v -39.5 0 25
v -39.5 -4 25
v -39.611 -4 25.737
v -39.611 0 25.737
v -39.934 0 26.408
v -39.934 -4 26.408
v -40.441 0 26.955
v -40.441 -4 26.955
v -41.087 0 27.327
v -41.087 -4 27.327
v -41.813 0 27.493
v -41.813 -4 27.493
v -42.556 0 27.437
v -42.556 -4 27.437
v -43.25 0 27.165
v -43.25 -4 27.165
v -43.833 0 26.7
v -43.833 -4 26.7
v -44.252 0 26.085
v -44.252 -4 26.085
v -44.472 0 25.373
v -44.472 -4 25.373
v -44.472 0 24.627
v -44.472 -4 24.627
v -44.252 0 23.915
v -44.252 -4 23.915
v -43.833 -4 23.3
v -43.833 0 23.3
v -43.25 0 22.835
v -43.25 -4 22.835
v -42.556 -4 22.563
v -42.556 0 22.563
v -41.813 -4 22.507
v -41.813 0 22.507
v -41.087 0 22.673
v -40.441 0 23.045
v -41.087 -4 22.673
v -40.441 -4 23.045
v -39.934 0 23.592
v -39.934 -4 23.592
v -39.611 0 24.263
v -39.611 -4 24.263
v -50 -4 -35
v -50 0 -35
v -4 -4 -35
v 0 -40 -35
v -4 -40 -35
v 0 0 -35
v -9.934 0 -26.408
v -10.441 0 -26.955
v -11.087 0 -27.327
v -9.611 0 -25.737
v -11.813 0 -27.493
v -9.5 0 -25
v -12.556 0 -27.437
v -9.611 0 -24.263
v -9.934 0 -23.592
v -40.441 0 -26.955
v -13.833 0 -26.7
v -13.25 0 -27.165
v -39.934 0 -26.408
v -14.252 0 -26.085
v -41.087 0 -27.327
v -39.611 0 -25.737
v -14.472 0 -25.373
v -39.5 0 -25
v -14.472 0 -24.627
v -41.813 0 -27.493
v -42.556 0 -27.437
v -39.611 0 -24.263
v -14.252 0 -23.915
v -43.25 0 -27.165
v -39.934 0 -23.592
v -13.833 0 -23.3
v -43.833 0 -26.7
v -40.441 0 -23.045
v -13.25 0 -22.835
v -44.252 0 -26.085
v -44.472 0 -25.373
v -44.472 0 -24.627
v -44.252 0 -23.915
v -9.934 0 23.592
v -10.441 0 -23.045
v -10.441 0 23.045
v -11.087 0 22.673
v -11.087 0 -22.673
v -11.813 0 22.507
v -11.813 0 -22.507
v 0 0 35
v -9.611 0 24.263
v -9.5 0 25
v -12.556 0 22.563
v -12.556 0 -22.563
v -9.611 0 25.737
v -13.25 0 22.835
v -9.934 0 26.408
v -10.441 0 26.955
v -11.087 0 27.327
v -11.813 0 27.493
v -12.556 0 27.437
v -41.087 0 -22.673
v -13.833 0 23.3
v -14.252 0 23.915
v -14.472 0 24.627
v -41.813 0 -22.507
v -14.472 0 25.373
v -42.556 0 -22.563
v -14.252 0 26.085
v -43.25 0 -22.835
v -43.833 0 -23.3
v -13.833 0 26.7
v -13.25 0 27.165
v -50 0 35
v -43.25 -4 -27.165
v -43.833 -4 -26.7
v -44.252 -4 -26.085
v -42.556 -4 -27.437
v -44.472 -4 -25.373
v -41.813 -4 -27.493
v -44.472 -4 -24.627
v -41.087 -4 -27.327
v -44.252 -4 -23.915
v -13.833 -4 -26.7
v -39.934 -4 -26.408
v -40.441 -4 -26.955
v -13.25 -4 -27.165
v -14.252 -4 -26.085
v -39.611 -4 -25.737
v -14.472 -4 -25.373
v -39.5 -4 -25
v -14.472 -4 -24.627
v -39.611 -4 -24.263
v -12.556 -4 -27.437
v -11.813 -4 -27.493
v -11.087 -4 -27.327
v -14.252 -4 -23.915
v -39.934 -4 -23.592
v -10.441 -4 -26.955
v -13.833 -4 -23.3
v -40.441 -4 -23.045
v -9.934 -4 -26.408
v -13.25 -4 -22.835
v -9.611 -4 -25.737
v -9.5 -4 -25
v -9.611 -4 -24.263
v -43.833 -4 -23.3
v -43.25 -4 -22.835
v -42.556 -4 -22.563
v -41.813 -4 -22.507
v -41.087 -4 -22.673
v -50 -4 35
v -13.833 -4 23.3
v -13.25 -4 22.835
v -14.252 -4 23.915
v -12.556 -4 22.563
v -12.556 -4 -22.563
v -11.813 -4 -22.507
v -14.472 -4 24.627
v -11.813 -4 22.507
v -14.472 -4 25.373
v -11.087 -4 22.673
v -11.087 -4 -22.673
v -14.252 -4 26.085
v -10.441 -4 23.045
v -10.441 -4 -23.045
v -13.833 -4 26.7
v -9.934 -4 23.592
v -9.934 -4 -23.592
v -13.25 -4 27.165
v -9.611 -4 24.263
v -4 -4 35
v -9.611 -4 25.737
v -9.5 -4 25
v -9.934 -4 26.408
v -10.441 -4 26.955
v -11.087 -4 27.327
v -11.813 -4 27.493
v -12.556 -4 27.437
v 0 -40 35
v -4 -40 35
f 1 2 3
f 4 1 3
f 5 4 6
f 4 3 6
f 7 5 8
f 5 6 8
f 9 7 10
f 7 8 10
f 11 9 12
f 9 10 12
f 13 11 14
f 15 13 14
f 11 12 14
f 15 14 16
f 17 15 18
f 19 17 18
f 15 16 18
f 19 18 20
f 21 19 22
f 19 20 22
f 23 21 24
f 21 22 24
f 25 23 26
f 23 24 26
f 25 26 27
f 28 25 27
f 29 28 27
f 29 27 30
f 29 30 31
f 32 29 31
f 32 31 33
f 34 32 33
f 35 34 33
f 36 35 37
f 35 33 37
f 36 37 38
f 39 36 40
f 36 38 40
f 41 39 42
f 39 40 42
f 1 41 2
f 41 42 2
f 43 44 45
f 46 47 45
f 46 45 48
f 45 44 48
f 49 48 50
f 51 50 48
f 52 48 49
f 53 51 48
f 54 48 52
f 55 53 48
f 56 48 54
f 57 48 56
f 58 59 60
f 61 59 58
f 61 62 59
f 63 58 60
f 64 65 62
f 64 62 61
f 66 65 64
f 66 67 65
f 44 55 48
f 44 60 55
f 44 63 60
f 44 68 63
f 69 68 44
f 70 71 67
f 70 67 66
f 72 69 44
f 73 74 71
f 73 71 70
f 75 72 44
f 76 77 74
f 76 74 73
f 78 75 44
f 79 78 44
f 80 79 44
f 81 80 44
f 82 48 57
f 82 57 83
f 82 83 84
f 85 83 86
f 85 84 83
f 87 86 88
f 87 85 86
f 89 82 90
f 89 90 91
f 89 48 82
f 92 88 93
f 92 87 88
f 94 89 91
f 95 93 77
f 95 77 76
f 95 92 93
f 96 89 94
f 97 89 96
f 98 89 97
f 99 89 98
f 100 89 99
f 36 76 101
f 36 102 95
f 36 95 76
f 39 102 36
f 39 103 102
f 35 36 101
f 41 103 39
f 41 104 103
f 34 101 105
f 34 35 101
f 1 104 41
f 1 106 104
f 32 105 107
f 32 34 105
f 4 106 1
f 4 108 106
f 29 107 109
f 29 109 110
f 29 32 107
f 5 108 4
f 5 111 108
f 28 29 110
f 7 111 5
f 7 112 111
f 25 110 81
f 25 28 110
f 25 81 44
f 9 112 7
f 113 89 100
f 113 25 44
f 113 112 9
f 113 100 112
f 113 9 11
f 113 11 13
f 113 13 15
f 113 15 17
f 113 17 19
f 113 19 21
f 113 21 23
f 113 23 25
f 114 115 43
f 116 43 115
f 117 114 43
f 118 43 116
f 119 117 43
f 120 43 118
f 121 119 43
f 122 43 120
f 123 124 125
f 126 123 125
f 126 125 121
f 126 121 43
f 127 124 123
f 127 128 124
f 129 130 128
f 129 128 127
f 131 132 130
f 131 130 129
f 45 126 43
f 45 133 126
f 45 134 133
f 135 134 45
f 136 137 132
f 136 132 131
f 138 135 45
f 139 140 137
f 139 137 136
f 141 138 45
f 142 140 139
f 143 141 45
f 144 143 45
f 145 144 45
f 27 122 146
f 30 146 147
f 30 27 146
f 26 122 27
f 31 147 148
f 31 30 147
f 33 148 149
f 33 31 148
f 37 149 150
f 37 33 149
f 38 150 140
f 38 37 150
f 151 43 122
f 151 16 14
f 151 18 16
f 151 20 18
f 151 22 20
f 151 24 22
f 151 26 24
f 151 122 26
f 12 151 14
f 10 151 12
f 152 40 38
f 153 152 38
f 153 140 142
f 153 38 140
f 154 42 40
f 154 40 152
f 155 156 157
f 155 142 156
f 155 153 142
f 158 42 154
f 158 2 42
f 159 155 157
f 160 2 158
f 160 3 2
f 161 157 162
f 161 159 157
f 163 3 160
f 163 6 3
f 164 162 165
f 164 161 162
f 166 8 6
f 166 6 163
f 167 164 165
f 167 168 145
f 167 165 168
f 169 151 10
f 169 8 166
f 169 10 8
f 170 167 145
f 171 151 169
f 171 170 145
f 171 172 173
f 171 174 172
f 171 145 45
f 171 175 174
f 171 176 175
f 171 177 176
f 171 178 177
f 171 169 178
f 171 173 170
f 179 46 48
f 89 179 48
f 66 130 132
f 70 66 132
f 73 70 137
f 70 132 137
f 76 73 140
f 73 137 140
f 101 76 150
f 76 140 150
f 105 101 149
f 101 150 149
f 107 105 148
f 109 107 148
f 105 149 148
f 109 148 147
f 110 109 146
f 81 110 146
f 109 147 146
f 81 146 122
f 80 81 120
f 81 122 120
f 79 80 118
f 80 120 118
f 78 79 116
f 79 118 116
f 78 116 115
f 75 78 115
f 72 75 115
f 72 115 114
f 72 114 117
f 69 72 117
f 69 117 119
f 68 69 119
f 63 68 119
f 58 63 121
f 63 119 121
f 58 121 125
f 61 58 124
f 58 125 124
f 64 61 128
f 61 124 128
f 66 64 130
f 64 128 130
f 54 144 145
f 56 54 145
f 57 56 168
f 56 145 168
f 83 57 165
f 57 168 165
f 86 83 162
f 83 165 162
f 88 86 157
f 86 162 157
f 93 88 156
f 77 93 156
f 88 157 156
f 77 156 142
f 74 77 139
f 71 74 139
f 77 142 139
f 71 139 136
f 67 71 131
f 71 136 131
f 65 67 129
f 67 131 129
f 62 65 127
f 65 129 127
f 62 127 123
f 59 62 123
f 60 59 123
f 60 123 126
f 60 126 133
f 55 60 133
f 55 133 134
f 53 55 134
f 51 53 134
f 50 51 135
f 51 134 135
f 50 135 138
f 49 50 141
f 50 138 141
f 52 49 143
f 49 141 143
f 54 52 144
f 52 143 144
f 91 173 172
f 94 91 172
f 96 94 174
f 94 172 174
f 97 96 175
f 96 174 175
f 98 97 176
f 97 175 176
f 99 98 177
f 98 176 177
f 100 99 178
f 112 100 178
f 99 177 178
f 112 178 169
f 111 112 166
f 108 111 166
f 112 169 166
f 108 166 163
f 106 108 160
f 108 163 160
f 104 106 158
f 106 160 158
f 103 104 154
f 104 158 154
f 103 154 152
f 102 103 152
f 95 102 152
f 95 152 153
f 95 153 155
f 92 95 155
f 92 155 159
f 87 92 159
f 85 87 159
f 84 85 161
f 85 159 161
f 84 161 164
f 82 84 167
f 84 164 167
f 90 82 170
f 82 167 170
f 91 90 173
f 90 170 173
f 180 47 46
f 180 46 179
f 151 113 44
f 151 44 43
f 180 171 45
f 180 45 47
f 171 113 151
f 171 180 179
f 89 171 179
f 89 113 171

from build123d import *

# Parameters (mm, degrees)
SALIENTE_EXTRUIR1_DEPTH      = 35
SALIENTE_EXTRUIR1_DEPTH_BACK = 35
CROQUIS3_R                   = 2.5
CORTAR_EXTRUIR1_DEPTH        = 4
CROQUIS4_W                   = 70
CROQUIS4_H                   = 10
CORTAR_EXTRUIR2_DEPTH        = 10


with BuildPart() as part:
    # Croquis2 → Saliente-Extruir1 (new body, two sides)
    with BuildSketch(Plane.XY) as saliente_extruir1_sk:
        Polygon((0, 0), (-50, 0), (-50, -4), (-4, -4), (-4, -50), (0, -50), align=None)
    extrude(amount=SALIENTE_EXTRUIR1_DEPTH)
    extrude(saliente_extruir1_sk.sketch, amount=-SALIENTE_EXTRUIR1_DEPTH_BACK)

    # Croquis3 → Cortar-Extruir1 (cut)
    with BuildSketch(Plane.XZ.offset(4)):
        with Locations((-12, 25)):
            Circle(CROQUIS3_R)
        with Locations((-12, -25)):
            Circle(CROQUIS3_R)
        with Locations((-42, 25)):
            Circle(CROQUIS3_R)
        with Locations((-42, -25)):
            Circle(CROQUIS3_R)
    extrude(amount=-CORTAR_EXTRUIR1_DEPTH, mode=Mode.SUBTRACT)

    # Croquis4 → Cortar-Extruir2 (cut)
    with BuildSketch(Plane.ZY.offset(4)):
        with Locations((0, -45)):
            Rectangle(CROQUIS4_W, CROQUIS4_H)
    extrude(amount=-CORTAR_EXTRUIR2_DEPTH, mode=Mode.SUBTRACT)


solid = part.part
